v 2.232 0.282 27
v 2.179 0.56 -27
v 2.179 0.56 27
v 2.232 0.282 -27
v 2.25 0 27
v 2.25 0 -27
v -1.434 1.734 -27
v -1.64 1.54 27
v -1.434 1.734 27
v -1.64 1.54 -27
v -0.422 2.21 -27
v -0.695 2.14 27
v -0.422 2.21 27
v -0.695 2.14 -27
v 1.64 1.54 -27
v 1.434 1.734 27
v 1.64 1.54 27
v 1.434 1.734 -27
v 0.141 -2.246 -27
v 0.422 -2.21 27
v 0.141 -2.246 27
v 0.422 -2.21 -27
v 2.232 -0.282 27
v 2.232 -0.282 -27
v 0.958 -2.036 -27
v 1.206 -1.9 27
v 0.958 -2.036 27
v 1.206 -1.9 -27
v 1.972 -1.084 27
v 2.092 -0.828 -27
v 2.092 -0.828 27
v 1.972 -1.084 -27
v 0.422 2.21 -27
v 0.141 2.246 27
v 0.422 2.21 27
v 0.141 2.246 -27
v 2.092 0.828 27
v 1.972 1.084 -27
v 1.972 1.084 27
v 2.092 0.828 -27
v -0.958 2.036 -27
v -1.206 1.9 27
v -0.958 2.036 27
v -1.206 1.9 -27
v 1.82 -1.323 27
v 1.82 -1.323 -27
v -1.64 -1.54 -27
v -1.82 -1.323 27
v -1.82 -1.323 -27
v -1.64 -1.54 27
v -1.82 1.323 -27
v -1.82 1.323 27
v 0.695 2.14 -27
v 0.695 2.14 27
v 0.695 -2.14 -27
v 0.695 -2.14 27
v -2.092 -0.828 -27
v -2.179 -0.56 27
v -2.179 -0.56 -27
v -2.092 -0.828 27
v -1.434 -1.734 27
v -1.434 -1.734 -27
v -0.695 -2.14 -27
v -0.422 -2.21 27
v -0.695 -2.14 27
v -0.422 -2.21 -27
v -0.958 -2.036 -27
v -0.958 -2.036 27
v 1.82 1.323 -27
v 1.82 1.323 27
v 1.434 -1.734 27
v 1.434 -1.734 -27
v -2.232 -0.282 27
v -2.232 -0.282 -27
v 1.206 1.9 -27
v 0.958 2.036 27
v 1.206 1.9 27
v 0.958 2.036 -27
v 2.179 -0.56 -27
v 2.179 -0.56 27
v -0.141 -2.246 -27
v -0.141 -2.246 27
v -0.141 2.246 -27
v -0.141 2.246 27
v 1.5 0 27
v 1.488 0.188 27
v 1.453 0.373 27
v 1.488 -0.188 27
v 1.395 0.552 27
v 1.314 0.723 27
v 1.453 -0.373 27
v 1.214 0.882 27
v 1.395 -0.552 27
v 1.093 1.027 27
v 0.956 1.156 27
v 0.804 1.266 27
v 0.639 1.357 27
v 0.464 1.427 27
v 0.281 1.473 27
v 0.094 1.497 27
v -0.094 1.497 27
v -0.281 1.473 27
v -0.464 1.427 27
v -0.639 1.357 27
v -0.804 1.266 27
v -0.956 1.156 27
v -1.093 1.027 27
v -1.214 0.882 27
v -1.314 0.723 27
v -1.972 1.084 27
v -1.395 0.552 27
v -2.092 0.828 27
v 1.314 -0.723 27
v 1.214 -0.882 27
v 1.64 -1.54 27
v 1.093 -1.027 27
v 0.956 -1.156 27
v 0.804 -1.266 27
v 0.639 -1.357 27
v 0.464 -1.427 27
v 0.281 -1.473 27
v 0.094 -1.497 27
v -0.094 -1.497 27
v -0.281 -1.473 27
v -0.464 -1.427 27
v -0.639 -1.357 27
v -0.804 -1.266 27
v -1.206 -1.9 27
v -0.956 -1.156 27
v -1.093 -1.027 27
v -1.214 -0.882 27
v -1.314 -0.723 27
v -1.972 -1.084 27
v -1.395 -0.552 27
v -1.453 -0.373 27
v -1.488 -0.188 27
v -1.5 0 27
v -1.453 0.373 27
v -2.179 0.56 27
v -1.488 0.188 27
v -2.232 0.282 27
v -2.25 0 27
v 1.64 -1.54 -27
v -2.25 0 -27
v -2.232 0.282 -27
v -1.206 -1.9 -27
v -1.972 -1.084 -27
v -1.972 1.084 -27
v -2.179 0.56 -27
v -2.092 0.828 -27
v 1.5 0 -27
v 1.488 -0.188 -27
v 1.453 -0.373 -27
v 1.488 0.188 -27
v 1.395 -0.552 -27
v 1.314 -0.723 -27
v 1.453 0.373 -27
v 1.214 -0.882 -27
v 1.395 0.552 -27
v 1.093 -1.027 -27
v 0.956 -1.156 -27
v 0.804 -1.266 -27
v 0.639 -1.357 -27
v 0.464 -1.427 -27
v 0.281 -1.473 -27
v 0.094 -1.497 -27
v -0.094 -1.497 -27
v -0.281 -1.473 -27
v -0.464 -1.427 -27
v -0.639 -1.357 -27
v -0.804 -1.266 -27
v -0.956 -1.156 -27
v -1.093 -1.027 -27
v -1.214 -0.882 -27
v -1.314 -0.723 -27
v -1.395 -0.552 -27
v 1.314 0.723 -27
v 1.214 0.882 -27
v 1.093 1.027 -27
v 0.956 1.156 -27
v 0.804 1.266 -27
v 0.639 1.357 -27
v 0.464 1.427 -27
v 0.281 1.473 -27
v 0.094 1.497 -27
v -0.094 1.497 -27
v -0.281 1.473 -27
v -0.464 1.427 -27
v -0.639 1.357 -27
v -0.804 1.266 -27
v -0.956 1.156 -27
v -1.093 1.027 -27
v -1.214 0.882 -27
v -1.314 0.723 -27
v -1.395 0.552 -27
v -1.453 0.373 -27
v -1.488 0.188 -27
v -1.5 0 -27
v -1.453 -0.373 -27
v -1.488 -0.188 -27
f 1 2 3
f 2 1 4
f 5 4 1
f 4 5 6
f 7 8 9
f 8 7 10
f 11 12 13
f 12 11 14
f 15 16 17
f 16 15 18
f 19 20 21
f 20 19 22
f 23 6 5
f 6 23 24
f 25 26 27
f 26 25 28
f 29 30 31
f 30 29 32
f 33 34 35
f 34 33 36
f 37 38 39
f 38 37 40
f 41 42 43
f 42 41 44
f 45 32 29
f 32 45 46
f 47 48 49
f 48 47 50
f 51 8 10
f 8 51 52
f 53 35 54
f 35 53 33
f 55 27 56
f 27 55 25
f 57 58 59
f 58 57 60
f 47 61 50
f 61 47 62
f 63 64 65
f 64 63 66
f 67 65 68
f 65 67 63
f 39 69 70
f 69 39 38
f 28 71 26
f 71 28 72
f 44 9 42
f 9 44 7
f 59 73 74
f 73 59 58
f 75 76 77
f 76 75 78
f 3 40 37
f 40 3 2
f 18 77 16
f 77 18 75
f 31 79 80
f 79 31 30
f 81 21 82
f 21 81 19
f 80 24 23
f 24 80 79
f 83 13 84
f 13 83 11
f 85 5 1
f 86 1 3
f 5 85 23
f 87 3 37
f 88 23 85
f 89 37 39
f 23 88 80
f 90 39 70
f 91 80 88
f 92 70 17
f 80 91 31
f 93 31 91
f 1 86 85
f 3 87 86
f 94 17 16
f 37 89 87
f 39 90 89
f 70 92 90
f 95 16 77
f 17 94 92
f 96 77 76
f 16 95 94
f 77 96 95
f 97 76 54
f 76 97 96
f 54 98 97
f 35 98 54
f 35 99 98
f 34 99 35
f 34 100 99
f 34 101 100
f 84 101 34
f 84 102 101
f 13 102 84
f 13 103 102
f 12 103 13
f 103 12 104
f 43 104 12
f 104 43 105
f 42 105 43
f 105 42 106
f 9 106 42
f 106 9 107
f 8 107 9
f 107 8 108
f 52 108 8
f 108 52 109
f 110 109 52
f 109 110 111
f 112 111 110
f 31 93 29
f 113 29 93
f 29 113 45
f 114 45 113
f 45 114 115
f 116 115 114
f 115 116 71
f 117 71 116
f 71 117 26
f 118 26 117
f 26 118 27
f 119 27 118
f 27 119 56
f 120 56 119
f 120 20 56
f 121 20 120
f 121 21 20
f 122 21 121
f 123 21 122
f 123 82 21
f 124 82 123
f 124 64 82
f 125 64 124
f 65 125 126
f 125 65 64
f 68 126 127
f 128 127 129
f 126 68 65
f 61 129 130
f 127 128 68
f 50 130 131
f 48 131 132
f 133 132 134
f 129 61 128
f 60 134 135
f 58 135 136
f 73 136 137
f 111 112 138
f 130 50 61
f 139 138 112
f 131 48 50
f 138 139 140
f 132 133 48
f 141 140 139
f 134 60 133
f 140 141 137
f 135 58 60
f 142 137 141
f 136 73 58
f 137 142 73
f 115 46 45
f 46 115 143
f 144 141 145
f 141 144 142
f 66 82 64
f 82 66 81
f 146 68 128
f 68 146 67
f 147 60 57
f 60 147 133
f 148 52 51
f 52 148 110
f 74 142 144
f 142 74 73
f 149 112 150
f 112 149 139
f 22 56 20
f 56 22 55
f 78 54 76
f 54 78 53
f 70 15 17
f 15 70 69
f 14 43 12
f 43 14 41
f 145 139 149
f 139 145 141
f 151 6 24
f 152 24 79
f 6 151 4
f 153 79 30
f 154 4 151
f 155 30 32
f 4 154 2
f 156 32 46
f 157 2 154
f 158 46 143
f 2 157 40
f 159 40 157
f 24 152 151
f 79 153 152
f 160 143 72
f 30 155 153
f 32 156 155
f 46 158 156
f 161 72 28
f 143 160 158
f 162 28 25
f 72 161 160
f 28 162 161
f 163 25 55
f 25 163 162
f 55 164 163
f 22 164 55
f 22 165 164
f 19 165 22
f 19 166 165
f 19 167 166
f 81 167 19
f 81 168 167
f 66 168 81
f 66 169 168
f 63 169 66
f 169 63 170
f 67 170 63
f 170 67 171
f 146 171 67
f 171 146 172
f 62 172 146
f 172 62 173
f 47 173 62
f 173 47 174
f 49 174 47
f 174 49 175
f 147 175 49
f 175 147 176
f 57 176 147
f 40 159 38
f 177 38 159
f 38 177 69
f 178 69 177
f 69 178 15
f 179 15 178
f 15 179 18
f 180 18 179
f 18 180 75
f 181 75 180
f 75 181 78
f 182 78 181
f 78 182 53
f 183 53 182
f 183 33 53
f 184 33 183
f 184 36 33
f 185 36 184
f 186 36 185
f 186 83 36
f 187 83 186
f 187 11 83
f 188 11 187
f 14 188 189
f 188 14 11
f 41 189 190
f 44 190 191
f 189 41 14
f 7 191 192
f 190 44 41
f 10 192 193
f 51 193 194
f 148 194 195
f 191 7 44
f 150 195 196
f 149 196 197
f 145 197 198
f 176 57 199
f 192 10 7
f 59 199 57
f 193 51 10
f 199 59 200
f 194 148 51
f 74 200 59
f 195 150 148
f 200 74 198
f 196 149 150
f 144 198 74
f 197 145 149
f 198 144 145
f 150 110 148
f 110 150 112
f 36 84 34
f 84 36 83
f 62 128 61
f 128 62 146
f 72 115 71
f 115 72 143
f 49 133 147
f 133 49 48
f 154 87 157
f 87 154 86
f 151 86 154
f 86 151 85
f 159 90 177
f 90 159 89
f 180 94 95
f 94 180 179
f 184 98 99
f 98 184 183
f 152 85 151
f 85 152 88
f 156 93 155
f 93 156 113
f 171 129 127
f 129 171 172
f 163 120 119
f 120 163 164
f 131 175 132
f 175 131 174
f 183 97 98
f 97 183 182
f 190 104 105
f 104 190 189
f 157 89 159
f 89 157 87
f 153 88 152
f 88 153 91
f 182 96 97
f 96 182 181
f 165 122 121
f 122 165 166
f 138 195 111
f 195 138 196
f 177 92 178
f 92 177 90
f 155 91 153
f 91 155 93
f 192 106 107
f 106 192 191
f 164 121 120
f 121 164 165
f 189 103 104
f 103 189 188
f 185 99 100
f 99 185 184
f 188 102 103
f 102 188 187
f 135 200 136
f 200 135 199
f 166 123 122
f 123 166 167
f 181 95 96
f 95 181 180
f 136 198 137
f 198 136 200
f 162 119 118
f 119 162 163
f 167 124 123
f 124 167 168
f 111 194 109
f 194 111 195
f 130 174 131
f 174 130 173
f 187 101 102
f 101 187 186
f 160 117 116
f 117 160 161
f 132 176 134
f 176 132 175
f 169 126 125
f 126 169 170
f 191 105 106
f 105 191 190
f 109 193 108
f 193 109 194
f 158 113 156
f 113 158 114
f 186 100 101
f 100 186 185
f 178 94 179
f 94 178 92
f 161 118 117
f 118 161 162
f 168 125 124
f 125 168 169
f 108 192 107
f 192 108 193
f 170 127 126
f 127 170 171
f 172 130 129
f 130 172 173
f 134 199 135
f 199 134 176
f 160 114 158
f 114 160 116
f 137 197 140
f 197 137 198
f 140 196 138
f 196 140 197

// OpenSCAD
$fn = 50;


difference() {
	union() {
		translate(v = [0, 0, -27.0000000000]) {
			cylinder(h = 54, r = 2.2500000000);
		}
	}
	union() {
		translate(v = [0, 0, -100.0000000000]) {
			cylinder(h = 200, r = 1.5000000000);
		}
	}
}
